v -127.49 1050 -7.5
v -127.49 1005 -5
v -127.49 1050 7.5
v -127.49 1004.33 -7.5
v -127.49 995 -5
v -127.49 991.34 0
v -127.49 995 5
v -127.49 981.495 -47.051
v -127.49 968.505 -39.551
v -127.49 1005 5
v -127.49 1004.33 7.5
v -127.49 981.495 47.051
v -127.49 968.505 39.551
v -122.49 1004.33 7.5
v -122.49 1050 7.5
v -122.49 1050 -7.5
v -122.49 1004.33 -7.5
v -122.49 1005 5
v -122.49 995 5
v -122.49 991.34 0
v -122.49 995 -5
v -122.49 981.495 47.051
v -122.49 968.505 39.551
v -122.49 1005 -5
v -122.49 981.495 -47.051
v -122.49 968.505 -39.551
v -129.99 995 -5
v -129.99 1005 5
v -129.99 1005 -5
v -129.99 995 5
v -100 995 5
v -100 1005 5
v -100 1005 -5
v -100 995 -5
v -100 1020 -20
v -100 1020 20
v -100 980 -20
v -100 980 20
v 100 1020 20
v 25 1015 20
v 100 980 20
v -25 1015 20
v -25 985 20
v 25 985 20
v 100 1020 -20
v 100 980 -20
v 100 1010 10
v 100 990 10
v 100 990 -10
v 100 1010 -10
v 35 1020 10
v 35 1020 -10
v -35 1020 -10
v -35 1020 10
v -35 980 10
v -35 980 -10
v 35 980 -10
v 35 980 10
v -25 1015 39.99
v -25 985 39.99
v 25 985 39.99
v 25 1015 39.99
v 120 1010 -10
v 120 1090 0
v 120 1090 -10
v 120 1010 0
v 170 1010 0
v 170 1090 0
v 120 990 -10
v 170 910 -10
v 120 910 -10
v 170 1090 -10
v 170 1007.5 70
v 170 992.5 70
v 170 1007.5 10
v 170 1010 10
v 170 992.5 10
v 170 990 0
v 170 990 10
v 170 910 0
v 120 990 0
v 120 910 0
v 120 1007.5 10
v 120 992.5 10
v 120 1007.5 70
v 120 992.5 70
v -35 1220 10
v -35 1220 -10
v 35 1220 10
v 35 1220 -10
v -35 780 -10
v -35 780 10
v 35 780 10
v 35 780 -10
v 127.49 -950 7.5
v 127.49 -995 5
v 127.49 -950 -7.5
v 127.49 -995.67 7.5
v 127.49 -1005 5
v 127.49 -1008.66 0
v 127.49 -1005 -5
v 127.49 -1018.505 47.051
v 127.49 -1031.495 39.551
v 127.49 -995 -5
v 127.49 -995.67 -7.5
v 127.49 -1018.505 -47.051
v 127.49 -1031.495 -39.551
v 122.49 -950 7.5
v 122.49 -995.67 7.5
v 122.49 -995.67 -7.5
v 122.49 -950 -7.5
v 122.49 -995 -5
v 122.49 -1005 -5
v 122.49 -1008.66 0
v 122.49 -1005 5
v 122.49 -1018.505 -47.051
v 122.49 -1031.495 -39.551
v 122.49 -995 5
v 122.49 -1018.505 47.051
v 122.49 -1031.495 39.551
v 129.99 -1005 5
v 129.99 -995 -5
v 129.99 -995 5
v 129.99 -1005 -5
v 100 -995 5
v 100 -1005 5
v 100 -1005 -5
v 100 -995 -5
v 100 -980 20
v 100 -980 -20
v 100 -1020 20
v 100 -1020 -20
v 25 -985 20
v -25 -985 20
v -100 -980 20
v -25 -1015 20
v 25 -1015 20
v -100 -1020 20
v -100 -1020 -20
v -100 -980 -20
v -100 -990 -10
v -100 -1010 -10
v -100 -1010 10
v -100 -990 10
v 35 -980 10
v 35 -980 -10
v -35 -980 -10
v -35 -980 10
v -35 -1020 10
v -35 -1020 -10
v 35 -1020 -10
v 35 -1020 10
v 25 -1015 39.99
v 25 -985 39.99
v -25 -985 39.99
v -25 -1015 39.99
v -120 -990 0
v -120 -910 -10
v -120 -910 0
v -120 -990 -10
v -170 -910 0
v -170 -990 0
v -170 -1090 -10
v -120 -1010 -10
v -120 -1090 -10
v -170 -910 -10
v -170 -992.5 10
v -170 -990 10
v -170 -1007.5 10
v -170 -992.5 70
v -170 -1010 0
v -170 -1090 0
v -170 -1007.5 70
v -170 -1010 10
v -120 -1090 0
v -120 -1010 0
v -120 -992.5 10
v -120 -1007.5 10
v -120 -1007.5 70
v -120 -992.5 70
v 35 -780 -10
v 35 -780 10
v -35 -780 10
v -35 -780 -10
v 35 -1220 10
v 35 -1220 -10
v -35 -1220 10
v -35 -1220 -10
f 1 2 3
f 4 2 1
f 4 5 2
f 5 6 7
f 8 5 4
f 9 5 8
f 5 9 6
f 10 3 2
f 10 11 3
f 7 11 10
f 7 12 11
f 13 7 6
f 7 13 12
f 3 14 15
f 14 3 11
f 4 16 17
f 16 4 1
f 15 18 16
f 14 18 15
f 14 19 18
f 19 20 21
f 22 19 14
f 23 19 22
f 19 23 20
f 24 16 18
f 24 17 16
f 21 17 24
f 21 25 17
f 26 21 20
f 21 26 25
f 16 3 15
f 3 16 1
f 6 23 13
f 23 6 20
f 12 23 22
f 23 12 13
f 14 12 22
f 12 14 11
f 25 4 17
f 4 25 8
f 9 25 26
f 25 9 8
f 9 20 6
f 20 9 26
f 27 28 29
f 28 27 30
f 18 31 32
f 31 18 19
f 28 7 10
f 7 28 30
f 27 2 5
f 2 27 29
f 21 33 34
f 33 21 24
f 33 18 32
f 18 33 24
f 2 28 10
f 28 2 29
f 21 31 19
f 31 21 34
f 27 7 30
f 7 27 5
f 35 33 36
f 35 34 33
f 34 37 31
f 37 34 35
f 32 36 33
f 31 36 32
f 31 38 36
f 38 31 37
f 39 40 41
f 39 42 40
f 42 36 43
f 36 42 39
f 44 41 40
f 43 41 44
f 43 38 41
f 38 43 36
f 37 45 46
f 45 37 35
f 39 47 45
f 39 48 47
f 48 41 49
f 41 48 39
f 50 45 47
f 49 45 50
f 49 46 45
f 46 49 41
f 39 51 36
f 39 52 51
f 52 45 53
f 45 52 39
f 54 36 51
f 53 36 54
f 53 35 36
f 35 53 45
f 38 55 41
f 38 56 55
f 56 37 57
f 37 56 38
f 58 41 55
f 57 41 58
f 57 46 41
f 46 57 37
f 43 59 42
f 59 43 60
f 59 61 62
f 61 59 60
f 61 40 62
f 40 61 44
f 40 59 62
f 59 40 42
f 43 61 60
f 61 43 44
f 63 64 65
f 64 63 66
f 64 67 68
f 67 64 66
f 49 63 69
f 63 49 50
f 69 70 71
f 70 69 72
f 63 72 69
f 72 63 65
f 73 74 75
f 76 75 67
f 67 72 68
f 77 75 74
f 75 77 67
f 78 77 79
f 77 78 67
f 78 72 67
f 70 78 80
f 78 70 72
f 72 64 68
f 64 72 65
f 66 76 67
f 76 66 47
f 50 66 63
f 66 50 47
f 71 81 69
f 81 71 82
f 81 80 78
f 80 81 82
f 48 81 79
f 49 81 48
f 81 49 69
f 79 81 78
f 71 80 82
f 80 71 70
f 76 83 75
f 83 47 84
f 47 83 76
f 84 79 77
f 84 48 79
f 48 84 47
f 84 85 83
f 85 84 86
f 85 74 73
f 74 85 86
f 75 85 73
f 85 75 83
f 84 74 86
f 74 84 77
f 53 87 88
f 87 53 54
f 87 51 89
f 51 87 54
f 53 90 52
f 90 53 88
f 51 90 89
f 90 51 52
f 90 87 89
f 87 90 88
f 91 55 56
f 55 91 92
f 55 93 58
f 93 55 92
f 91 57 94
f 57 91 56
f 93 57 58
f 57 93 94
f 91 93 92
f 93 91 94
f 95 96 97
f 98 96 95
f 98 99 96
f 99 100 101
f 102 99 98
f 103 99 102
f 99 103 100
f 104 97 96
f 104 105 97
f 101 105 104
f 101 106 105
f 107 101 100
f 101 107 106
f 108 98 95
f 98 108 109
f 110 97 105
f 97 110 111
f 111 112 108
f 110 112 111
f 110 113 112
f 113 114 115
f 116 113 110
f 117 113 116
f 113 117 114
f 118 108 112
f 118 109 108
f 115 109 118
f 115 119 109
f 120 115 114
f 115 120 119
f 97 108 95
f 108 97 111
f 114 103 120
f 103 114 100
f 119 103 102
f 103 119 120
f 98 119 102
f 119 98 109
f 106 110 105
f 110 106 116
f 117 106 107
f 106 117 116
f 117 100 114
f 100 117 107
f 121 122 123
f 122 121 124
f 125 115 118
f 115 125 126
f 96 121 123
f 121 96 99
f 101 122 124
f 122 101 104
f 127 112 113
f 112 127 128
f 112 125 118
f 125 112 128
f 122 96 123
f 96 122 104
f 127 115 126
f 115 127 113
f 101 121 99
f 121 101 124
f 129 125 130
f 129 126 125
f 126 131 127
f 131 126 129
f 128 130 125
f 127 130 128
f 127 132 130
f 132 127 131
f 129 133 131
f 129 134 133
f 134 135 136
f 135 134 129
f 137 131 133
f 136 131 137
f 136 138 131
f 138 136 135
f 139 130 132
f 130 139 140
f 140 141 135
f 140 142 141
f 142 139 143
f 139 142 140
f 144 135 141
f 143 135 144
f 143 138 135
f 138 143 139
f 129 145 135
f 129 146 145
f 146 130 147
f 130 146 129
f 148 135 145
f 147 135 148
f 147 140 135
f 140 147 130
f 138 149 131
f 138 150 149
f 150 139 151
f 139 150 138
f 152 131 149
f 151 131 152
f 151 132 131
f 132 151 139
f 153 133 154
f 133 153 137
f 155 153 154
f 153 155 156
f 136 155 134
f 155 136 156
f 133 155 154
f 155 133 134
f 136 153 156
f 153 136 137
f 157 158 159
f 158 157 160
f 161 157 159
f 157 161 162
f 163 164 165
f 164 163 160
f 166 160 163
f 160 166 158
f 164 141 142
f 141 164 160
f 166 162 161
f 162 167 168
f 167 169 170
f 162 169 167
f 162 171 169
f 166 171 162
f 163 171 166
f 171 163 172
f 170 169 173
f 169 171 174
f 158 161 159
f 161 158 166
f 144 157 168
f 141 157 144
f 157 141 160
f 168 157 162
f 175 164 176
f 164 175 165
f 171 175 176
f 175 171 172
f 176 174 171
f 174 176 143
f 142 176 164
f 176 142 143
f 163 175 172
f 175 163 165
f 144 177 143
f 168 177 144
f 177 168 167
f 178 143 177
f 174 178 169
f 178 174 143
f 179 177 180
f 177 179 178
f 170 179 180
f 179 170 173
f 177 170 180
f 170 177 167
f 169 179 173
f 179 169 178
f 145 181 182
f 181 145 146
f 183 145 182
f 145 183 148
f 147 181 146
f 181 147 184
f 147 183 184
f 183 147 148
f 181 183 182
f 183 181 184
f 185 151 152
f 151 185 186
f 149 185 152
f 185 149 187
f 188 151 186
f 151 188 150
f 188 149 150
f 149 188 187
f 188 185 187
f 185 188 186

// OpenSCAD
// file: avion_corps.scad
module avion_corps(acf_lg=200, acf_pf=40, acf_ht=40)
{
//    acf_lg = 200;
//    acf_pf = 40;
//    acf_ht = 40;
    
    avion_corps_fuselage(acf_lg, acf_pf, acf_ht);
    
    acn_lg = 30;
    acn_pf = 10;
    acn_ht = 10;
    
    translate([acf_lg/2-0.01, 0, 0])
    avion_corps_nez(acn_lg, acn_pf, acn_ht, 5, 50, 15, 3);
    
    ach_lg = 50;
    ach_pf = 30;
    ach_ht = 20;
    
    translate([-ach_lg/2, -ach_pf/2, acf_ht/2-0.01])
    avion_corps_habitacle(ach_lg, ach_pf, ach_ht);
}

module avion_corps_fuselage(lg, pf, ht)
{
    cube([lg, pf, ht], center=true);
}

module avion_corps_nez(lg, pf, ht, pale_lg, pale_pf, pale_ht, pale_nb)
{
    translate([0, -pf/2, -ht/2])
    cube([lg, pf, ht]);
    
    rotate([$t*360*10,0,0])
    for (i=[0:pale_nb])
        rotate([360/pale_nb*i,0,0])
        translate([lg-pale_lg*1.5, 0, -pale_ht/2])
        cube([pale_lg, pale_pf, pale_ht]);
}

module avion_corps_habitacle(lg, pf, ht)
{
    cube([lg, pf, ht]);
}

avion_corps();
// file: avion_arriere.scad
module avion_arriere()
{
    aaq_lg = 70;
    aaq_pf = 20;
    aaq_ht = 20;
    
    translate([-aaq_lg,-aaq_pf/2,-aaq_ht/2])
    avion_arriere_queue(aaq_lg, aaq_pf, aaq_ht);
  
    aad_lg = 50;
    aad_pf = 15;
    aad_ht = 60;
    
    translate([-aaq_lg,0,aaq_ht/2])
    avion_arriere_derive(aad_lg, aad_pf, aad_ht);
  
    aas_lg = 50;
    aas_pf = 80;
    aas_ht = 10;
    
    translate([-aaq_lg,0,0])
    {
        translate([0,aaq_pf/2,0])
        avion_arriere_stabilisateur(aas_lg, aas_pf, aas_ht);
        
        translate([0,-aaq_pf/2,0])
        mirror([0,1,0])
        avion_arriere_stabilisateur(aas_lg, aas_pf, aas_ht);
    }
}

module avion_arriere_queue(lg, pf, ht)
{
    cube([lg, pf, ht]);
}

module avion_arriere_derive(lg, pf, ht)
{
    translate([0, -pf/2, 0])
    cube([lg, pf, ht]);
}

module avion_arriere_stabilisateur(lg, pf, ht)
{
    translate([0,0,-ht])
    cube([lg, pf, ht]);
}

avion_arriere();
// file: avion_aile.scad
module avion_aile(aa_lg=70, aa_pf=200, aa_ht=20)
{
    translate([-aa_lg/2, 0, -aa_ht/2])
    cube([aa_lg, aa_pf, aa_ht]);
}


avion_aile();
// main file
use <avion_aile.scad>;
use <avion_arriere.scad>;
use <avion_corps.scad>;


module avion(acf_lg=200, acf_pf=40, acf_ht=40)
{
    translate([0,0,0])
    avion_corps(acf_lg, acf_pf, acf_ht);

    translate([-acf_lg/2,0,0])
    avion_arriere();

    translate([0,acf_pf/2,0])
    avion_aile();

    translate([0,-acf_pf/2,0])
    mirror([0,1,0])
    avion_aile();
}


acf_lg = 200;
acf_pf = 40;
acf_ht = 40;

ag = sin(($t-0.5)*720)*500;

echo(ag);
rotate([0,0,$t*360])
{
    dis = 1000;
    
    color("red")
    translate([0,dis,ag])
    mirror([1,0,0])
    avion();
        
    color("blue")
    translate([0,-dis,-ag])
    avion();
}
